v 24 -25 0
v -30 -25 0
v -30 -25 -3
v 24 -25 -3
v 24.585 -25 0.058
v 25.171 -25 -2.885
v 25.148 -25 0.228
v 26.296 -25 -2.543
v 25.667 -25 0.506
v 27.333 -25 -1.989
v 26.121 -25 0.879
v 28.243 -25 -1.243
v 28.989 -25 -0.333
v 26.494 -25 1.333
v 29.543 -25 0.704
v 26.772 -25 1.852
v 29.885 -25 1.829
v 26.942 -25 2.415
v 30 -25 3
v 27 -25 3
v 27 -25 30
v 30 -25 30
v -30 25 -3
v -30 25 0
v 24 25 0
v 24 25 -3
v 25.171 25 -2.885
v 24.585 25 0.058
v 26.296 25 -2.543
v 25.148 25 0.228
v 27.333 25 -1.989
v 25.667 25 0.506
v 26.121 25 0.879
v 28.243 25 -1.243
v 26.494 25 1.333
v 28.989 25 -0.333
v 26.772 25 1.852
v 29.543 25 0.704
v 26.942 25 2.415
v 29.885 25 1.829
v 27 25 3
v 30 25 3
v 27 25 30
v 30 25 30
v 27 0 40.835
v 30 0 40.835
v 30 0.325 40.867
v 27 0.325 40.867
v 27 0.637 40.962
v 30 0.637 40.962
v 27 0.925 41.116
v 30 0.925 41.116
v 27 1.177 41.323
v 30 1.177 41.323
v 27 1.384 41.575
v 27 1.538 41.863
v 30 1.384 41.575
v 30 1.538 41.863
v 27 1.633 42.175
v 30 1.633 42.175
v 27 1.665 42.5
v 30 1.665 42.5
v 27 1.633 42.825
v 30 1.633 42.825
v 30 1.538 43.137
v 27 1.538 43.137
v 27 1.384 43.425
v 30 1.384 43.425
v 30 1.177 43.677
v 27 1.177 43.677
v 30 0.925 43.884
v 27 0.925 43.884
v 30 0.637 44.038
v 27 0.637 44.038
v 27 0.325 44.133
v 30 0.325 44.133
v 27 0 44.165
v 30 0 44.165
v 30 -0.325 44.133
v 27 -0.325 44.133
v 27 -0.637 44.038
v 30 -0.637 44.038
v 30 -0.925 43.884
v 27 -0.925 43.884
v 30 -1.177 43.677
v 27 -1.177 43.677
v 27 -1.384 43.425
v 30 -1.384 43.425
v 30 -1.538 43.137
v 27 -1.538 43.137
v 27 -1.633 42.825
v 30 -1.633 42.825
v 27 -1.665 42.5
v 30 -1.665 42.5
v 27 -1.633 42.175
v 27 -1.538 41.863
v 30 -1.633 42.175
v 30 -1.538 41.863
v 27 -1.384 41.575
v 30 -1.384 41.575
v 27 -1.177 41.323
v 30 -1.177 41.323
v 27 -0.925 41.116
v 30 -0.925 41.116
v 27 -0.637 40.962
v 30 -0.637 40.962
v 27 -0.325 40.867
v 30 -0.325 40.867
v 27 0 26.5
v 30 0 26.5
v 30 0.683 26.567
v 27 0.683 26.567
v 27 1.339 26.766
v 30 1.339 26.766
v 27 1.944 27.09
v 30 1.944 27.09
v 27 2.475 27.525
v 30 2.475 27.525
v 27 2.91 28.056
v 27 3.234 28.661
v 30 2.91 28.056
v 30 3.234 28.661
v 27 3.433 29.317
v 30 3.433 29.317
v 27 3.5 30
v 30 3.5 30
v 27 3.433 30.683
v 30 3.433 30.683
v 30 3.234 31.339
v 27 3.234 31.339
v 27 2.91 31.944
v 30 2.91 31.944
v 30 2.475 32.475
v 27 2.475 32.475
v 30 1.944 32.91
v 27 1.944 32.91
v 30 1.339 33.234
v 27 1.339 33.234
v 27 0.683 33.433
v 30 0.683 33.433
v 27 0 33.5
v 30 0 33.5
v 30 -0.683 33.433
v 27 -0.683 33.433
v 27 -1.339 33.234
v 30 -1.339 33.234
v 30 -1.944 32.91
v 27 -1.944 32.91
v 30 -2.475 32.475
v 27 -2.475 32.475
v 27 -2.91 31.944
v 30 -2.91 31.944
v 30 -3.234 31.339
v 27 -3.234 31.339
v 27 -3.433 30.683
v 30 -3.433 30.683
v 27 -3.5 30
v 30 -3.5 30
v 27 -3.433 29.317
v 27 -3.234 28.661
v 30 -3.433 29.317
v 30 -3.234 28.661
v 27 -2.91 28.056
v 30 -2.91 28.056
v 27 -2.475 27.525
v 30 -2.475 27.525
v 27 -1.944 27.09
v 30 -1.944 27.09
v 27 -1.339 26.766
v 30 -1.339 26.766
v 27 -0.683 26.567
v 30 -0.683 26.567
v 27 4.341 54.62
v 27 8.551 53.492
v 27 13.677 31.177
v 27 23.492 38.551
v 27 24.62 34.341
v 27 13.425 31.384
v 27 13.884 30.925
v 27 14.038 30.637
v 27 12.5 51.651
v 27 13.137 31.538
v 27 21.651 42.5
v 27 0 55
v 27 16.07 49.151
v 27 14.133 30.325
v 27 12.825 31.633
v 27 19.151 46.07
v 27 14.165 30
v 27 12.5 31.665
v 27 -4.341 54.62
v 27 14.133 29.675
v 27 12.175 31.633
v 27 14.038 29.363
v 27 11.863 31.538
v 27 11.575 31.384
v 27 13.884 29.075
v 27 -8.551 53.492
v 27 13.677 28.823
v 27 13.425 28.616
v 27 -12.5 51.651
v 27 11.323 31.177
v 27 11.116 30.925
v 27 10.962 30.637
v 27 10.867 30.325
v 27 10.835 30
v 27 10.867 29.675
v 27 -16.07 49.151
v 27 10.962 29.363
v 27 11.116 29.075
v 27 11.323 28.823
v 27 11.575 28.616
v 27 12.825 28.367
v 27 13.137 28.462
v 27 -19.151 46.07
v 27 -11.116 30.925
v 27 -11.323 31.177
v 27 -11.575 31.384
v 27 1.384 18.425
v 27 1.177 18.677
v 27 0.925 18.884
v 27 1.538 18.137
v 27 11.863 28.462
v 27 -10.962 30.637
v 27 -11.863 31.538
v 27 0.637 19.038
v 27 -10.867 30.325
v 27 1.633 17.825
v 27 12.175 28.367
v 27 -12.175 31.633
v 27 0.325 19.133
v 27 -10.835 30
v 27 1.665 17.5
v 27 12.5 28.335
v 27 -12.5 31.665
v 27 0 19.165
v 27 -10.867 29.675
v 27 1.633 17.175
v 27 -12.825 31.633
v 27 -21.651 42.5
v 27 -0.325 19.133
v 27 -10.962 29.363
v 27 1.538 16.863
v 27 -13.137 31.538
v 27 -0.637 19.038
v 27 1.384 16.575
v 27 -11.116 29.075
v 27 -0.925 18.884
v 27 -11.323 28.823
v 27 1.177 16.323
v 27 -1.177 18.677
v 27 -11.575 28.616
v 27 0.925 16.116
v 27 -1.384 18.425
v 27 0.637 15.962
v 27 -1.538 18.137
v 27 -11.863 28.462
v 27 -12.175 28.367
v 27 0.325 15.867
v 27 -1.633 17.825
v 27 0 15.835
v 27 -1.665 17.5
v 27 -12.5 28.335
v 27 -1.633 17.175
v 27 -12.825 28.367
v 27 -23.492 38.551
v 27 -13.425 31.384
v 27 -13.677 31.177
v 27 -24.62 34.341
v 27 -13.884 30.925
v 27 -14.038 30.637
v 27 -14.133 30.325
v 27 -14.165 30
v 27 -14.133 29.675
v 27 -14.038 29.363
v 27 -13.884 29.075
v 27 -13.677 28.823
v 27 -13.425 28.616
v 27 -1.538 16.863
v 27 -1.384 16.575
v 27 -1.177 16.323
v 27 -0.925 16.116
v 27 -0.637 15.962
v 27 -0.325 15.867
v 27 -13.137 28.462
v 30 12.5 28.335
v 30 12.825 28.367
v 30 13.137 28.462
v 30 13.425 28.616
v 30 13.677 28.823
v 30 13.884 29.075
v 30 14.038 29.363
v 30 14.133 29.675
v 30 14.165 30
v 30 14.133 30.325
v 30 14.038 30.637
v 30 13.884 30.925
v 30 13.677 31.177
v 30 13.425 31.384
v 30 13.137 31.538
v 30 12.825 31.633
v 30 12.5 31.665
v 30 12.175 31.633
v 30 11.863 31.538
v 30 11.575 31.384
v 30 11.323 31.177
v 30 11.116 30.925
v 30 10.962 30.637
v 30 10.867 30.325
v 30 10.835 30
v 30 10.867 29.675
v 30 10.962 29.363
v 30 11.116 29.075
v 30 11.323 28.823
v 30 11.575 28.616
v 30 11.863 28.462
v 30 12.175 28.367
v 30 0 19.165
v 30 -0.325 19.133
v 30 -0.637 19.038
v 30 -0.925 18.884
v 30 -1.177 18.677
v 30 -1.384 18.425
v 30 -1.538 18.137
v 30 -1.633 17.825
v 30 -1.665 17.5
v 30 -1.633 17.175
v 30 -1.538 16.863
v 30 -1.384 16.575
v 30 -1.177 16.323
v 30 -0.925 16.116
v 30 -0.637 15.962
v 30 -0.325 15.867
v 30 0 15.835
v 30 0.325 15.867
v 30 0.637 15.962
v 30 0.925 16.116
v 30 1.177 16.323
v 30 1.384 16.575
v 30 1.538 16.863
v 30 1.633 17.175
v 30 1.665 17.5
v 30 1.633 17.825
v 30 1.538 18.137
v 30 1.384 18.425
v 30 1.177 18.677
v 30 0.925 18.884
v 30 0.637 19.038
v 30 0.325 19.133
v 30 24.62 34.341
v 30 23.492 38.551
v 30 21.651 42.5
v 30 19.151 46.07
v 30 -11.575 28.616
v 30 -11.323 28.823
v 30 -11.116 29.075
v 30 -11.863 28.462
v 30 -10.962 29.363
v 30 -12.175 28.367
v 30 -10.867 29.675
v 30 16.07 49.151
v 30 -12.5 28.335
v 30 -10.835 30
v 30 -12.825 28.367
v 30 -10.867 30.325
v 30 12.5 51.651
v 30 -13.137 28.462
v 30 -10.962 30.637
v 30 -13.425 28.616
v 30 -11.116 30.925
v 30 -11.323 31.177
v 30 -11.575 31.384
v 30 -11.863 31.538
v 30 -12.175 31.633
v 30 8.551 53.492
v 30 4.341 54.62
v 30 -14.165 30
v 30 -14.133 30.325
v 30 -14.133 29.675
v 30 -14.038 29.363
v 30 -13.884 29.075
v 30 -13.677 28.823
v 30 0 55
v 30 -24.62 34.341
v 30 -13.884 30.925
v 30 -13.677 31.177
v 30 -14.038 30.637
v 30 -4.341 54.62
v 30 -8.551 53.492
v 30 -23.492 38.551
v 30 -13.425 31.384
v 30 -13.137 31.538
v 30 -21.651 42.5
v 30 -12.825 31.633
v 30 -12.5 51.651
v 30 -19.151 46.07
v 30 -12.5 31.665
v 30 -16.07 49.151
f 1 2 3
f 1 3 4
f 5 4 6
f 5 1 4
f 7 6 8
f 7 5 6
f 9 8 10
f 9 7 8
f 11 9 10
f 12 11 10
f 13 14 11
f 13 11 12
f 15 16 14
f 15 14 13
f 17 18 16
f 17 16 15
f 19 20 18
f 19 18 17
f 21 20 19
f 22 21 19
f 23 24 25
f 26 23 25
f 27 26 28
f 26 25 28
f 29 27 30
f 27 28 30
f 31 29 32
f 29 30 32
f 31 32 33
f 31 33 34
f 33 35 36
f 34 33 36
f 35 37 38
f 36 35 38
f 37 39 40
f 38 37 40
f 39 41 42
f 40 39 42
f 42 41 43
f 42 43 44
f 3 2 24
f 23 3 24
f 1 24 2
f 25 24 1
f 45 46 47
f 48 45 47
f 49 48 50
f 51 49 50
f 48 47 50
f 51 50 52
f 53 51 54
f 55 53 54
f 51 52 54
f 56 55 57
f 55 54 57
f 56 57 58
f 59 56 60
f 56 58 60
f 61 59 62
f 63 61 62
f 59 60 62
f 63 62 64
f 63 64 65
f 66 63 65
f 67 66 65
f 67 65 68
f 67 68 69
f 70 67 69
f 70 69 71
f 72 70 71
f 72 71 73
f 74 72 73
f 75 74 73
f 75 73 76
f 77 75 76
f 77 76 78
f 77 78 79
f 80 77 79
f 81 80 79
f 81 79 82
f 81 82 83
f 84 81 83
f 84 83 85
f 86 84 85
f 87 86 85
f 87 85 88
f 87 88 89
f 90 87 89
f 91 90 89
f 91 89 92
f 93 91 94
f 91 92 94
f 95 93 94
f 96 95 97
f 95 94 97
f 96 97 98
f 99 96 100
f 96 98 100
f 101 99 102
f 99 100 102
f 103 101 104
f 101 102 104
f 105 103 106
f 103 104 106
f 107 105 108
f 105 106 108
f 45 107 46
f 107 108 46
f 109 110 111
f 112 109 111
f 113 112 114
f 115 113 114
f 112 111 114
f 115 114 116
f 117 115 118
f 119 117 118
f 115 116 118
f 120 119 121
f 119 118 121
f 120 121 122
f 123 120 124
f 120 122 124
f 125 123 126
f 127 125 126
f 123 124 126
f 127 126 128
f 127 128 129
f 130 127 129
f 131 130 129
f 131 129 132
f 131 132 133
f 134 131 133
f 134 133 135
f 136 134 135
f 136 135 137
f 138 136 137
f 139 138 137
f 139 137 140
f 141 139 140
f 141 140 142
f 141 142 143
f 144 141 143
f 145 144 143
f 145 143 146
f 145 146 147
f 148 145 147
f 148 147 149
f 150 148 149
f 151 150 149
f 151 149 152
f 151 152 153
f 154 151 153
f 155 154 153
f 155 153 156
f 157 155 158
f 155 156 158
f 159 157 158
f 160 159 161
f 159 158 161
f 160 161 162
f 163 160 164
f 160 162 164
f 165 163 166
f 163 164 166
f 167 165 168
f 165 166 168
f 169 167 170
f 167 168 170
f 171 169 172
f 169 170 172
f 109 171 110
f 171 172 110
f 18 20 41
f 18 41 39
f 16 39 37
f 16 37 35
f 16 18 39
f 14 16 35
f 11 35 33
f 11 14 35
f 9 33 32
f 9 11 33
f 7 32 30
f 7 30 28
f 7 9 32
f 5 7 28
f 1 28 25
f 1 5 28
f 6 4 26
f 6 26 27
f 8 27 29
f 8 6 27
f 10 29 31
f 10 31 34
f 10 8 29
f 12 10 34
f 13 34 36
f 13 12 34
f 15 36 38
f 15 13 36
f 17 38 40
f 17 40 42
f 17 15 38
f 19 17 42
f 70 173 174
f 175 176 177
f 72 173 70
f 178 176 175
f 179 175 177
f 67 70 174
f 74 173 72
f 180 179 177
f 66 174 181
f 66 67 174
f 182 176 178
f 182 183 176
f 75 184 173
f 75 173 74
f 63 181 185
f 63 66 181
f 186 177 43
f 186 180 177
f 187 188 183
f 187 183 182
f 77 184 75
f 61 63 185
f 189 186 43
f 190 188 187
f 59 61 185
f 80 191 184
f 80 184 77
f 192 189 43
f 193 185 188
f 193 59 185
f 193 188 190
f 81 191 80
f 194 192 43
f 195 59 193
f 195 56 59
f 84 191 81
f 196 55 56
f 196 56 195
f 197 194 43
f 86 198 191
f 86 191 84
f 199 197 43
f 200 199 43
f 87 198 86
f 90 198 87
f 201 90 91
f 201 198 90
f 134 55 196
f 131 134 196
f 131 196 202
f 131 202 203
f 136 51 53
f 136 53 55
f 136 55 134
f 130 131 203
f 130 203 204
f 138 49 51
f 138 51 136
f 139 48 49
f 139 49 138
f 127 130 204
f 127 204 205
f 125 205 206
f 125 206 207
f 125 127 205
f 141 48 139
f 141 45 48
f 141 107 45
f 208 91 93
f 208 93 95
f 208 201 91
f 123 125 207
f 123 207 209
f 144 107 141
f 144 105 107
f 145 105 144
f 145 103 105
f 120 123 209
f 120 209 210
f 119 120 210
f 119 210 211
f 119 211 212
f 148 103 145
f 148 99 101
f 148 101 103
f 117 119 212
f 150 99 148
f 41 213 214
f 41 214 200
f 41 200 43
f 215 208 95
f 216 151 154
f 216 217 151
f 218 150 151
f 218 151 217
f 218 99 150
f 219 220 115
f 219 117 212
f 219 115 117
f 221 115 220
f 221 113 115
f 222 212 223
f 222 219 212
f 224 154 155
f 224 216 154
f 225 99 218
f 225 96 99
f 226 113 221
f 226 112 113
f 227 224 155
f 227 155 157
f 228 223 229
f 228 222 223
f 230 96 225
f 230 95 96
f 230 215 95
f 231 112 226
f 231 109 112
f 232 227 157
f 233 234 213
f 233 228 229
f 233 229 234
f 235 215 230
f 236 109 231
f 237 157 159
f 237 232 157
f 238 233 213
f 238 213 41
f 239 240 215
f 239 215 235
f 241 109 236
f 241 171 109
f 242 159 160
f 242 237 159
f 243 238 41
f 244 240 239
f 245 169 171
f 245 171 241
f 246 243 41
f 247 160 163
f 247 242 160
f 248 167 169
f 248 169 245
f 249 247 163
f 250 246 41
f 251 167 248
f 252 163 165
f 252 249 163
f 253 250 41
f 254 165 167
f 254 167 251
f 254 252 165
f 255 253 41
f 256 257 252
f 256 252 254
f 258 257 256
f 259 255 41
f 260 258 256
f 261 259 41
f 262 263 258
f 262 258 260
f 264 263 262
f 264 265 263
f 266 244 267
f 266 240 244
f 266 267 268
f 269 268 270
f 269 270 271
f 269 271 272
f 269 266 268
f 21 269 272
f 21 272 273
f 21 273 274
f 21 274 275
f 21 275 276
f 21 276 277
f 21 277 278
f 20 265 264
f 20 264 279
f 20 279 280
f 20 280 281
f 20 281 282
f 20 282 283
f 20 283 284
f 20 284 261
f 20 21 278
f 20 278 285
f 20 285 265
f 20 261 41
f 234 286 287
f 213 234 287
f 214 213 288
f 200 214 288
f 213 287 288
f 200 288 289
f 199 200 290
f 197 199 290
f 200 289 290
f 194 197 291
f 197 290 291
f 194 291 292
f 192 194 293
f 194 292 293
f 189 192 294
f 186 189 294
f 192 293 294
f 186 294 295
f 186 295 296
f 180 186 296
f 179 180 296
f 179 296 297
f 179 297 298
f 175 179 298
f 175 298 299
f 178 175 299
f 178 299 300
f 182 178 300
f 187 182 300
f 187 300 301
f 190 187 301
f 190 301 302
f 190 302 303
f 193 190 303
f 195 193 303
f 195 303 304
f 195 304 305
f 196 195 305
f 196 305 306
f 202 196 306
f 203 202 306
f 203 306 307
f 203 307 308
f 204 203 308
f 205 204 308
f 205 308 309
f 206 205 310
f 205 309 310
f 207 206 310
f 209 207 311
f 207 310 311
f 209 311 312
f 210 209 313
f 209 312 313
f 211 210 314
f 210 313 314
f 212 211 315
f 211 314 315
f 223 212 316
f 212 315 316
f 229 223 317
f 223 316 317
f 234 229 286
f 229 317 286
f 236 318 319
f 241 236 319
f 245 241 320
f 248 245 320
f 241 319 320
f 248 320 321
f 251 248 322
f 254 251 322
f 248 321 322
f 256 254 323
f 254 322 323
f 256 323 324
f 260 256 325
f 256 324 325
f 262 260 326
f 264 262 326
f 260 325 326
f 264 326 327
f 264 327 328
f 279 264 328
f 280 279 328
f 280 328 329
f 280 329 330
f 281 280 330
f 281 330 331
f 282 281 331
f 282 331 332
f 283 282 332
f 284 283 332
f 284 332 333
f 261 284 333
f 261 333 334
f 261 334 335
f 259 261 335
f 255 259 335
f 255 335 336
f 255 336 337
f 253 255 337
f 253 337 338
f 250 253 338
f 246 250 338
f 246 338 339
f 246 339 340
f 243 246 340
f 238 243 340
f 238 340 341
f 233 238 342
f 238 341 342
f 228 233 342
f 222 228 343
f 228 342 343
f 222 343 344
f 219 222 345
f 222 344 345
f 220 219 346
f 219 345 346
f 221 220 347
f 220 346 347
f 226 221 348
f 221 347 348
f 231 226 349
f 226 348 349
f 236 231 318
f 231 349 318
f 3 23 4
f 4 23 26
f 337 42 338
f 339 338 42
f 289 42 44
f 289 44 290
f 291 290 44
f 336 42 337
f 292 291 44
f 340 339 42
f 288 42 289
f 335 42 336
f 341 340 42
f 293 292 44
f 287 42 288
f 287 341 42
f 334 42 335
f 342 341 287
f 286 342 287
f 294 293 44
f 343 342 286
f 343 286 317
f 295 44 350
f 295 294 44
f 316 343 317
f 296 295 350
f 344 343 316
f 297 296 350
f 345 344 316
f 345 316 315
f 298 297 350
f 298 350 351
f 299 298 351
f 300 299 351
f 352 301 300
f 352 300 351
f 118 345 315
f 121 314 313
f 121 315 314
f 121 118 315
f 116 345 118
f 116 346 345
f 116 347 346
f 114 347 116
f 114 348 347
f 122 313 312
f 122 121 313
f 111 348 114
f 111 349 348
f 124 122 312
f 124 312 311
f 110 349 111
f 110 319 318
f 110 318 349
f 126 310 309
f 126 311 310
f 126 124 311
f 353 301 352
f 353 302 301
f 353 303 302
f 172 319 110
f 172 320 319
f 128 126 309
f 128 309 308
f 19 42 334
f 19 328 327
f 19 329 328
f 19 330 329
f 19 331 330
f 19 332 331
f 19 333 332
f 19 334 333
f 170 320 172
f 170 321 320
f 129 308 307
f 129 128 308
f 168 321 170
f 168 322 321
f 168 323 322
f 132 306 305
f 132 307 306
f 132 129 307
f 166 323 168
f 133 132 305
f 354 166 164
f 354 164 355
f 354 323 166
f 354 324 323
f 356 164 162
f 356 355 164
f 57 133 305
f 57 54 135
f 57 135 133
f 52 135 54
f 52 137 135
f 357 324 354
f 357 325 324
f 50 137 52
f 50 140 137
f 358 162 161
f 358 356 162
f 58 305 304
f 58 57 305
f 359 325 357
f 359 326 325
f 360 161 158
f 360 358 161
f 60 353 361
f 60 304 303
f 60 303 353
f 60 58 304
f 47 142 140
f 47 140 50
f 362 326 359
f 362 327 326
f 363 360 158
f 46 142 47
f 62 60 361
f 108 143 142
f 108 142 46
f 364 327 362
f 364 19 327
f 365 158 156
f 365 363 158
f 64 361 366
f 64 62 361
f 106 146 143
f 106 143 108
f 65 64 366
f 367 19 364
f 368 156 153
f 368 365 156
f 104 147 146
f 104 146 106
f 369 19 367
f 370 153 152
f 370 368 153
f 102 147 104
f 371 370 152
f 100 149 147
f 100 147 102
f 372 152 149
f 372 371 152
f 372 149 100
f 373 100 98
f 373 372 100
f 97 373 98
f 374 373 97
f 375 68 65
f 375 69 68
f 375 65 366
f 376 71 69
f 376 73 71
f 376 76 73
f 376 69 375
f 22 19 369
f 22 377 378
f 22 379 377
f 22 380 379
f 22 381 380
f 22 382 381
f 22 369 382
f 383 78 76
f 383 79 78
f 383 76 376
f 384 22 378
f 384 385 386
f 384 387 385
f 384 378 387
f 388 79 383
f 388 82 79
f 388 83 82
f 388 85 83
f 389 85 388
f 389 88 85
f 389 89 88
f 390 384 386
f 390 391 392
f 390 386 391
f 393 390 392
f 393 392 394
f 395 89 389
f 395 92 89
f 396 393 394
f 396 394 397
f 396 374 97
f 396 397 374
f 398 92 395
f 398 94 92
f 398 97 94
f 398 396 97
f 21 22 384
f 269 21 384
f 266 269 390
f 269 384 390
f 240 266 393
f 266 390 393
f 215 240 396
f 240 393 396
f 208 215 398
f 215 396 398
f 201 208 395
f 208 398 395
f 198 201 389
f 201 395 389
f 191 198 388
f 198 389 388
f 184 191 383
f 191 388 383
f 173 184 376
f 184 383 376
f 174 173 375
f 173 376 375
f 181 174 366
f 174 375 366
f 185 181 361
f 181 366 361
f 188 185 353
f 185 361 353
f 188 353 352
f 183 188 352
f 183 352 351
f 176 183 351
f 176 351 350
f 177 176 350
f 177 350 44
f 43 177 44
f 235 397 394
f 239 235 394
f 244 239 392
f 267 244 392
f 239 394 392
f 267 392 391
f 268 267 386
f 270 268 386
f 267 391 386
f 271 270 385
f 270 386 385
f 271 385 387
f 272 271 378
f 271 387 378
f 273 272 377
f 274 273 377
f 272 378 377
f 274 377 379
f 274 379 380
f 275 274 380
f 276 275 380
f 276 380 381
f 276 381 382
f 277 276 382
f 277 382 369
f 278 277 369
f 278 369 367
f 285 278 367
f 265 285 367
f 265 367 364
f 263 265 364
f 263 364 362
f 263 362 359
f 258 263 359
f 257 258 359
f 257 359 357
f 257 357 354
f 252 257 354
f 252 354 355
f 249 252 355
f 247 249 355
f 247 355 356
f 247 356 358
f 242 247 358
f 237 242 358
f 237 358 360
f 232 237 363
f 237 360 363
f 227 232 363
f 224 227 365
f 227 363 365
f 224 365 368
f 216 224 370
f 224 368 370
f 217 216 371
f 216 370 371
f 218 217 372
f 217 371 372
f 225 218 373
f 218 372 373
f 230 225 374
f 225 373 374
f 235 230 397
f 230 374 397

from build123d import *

# Parameters (mm, degrees)
SKETCH1_W                    = 60
SKETCH1_H                    = 50
BASE_FLANGE1_DEPTH           = 3
EDGE_FLANGE1_STRIP_W         = 18
EDGE_FLANGE1_STRIP_H         = 3
EDGE_FLANGE1_STRIP_CUT_DEPTH = 50
EDGE_FLANGE1_DEPTH           = 50
CUT_EXTRUDE1_DEPTH           = 10
SKETCH10_R                   = 3.5
SKETCH10_R_2                 = 1.665
CUT_EXTRUDE2_DEPTH           = 10


# Sheet-metal steps are written as plain solids
with BuildPart() as part:
    # Sketch1 → Base-Flange1 (new body)
    with BuildSketch(Plane.XY):
        Rectangle(SKETCH1_W, SKETCH1_H)
    extrude(amount=-BASE_FLANGE1_DEPTH)

    # Edge-Flange1 strip (across the edge) → Edge-Flange1 strip cut (cut)
    with BuildSketch(Plane(origin=(30, -25, 0), x_dir=(-1, 0, 0), z_dir=(0, 1, 0))):
        with Locations((-3, -1.5)):
            Rectangle(EDGE_FLANGE1_STRIP_W, EDGE_FLANGE1_STRIP_H)
    extrude(amount=EDGE_FLANGE1_STRIP_CUT_DEPTH, mode=Mode.SUBTRACT)

    # Edge-Flange1 section (across the edge) → Edge-Flange1 (add)
    with BuildSketch(Plane(origin=(30, -25, 0), x_dir=(-1, 0, 0), z_dir=(0, 1, 0))):
        with BuildLine():
            Line((0, 3), (0, 57))
            Line((0, 57), (3, 57))
            Line((3, 57), (3, 3))
            ThreePointArc((3, 3), (3.878679656, 0.878679656), (6, 0))
            Line((6, 0), (6, -3))
            ThreePointArc((6, -3), (1.757359313, -1.242640687), (0, 3))
        make_face()
    extrude(amount=EDGE_FLANGE1_DEPTH)

    # Sketch9 → Cut-Extrude1 (cut)
    with BuildSketch(Plane(origin=(30, 0, 0), x_dir=(0, 0, -1), z_dir=(1, 0, 0))):
        with BuildLine():
            Line((-30, 25), (-57, 25))
            Line((-57, 25), (-57, -25))
            Line((-57, -25), (-30, -25))
            ThreePointArc((-30, -25), (-55, 0), (-30, 25))
        make_face()
    extrude(amount=-CUT_EXTRUDE1_DEPTH, mode=Mode.SUBTRACT)

    # Sketch10 → Cut-Extrude2 (cut)
    with BuildSketch(Plane(origin=(30, 0, 0), x_dir=(0, 0, -1), z_dir=(1, 0, 0))):
        with Locations((-30, 0)):
            Circle(SKETCH10_R)
        with Locations((-30, 12.5)):
            Circle(SKETCH10_R_2)
        with Locations((-42.5, 0)):
            Circle(SKETCH10_R_2)
        with Locations(Location((-30, -12.5, 0), (0, 0, 180))):
            Circle(SKETCH10_R_2)
        with Locations(Location((-17.5, 0, 0), (0, 0, 180))):
            Circle(SKETCH10_R_2)
    extrude(amount=-CUT_EXTRUDE2_DEPTH, mode=Mode.SUBTRACT)


solid = part.part
